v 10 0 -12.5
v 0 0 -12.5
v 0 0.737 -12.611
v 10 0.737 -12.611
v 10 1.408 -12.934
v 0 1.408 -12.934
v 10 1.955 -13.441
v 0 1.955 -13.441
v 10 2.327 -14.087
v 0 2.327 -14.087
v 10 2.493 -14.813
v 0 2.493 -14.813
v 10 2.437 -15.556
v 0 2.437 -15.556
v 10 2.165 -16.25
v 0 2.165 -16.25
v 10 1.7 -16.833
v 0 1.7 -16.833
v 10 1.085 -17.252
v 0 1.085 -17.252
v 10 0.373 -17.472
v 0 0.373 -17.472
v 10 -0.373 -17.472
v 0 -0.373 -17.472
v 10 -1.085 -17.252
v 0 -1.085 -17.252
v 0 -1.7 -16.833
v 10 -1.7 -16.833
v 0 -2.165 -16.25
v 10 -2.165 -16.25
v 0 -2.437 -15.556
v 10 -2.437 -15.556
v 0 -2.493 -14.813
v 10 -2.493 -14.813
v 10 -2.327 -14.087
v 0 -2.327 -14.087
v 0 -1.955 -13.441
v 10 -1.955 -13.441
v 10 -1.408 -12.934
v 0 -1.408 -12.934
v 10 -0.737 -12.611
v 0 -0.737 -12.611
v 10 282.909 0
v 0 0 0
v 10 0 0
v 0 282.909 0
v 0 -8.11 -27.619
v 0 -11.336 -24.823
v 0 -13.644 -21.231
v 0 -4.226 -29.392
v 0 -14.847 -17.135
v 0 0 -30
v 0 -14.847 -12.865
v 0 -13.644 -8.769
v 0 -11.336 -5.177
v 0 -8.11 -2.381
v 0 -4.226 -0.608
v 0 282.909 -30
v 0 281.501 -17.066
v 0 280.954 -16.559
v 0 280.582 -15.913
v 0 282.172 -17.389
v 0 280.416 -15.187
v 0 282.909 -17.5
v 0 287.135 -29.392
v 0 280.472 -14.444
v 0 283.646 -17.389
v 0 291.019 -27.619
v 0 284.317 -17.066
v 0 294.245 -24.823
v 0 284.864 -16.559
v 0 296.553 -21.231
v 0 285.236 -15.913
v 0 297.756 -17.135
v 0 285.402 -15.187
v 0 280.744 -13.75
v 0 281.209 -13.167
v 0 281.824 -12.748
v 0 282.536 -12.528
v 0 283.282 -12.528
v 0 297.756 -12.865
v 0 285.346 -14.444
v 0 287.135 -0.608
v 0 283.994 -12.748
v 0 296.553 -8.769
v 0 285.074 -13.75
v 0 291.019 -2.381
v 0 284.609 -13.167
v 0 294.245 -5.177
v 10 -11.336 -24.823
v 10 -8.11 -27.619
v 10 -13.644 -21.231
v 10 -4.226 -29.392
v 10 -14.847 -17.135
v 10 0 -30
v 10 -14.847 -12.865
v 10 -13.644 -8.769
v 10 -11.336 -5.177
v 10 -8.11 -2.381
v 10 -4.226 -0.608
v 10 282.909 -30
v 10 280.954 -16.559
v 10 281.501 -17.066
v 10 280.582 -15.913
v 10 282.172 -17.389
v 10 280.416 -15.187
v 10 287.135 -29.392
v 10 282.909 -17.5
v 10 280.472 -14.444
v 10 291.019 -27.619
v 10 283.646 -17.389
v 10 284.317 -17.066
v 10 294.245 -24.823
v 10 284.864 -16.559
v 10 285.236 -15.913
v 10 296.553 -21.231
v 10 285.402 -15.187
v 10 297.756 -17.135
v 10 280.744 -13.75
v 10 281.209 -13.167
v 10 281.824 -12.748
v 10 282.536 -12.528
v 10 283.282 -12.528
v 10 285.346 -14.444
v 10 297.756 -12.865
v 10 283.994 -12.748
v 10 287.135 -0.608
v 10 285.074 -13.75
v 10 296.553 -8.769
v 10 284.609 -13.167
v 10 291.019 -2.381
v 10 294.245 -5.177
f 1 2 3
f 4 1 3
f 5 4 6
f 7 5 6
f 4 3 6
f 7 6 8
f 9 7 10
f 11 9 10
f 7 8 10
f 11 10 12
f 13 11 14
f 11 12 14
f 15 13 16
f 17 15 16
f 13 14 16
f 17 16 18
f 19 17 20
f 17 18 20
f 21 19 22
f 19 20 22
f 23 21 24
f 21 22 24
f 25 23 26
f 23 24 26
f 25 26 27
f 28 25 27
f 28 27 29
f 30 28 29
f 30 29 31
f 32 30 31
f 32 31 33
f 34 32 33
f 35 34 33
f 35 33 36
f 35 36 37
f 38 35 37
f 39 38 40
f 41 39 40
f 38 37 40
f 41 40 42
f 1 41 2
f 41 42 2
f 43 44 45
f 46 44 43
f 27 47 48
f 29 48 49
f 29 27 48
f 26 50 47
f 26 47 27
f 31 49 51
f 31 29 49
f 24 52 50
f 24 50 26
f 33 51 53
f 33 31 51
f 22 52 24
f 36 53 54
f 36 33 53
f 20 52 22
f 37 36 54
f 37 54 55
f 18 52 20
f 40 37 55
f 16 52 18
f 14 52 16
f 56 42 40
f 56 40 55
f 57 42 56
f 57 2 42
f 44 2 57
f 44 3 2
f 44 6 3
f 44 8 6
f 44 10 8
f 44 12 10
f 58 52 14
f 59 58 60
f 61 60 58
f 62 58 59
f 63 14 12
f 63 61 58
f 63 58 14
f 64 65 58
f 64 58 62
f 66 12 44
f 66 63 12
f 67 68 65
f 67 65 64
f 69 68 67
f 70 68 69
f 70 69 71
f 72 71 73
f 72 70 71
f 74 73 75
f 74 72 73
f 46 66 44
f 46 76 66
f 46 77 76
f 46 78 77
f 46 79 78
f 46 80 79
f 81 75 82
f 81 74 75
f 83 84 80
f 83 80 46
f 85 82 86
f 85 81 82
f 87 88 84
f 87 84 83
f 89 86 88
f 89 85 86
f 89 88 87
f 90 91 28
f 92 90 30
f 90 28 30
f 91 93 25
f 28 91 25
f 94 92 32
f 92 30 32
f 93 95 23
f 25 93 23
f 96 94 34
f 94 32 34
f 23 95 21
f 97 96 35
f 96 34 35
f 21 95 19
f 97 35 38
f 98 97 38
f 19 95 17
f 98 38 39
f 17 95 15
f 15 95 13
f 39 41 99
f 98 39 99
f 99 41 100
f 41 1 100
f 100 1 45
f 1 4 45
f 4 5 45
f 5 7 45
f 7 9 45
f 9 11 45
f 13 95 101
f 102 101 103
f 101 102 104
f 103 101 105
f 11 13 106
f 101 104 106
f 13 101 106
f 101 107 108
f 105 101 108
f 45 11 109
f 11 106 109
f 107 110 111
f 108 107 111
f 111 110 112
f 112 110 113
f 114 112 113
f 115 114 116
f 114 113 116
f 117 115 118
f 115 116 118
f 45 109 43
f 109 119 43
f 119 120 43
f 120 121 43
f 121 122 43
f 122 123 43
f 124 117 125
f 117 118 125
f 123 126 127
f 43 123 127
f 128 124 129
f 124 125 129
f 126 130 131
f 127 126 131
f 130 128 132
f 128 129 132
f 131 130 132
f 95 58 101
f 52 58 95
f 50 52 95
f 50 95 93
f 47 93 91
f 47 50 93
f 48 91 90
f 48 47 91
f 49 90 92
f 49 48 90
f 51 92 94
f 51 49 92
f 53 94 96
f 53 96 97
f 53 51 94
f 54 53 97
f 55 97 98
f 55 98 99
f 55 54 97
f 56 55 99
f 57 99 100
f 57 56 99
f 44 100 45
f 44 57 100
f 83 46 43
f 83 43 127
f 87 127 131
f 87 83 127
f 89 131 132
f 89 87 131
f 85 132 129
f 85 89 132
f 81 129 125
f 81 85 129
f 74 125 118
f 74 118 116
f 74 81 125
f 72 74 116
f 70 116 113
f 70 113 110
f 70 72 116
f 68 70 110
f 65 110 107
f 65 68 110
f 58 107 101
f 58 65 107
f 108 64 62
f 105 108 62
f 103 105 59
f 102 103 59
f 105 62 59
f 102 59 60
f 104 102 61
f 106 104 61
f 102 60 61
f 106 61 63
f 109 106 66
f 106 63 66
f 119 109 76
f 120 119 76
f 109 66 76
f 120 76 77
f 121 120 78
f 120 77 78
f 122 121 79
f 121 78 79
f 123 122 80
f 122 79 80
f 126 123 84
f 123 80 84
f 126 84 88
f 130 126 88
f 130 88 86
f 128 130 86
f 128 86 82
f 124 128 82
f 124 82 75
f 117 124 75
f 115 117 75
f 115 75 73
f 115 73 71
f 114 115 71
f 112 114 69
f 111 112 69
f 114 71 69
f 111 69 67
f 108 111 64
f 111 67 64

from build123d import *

# Parameters (mm, degrees)
EXTRUDE_1_DEPTH     = 10
SKETCH_3_R          = 2.5
CUT_EXTRUDE_1_DEPTH = 10


with BuildPart() as part:
    # 草图2 → 凸台-拉伸1 (new body)
    with BuildSketch(Plane(origin=(0, 0, 0), x_dir=(0, 0, -1), z_dir=(1, 0, 0))):
        with BuildLine():
            Line((0, 0), (0, 282.909))
            ThreePointArc((0, 282.909), (15, 297.909), (30, 282.909))
            Line((30, 282.909), (30, 0))
            ThreePointArc((30, 0), (15, -15), (0, 0))
        make_face()
    extrude(amount=EXTRUDE_1_DEPTH)

    # 草图3 → 切除-拉伸1 (cut)
    with BuildSketch(Plane.ZY):
        with Locations((-15, 0)):
            Circle(SKETCH_3_R)
        with Locations(Location((-15, 282.909, 0), (0, 0, 180))):
            Circle(SKETCH_3_R)
    extrude(amount=-CUT_EXTRUDE_1_DEPTH, mode=Mode.SUBTRACT)


solid = part.part
